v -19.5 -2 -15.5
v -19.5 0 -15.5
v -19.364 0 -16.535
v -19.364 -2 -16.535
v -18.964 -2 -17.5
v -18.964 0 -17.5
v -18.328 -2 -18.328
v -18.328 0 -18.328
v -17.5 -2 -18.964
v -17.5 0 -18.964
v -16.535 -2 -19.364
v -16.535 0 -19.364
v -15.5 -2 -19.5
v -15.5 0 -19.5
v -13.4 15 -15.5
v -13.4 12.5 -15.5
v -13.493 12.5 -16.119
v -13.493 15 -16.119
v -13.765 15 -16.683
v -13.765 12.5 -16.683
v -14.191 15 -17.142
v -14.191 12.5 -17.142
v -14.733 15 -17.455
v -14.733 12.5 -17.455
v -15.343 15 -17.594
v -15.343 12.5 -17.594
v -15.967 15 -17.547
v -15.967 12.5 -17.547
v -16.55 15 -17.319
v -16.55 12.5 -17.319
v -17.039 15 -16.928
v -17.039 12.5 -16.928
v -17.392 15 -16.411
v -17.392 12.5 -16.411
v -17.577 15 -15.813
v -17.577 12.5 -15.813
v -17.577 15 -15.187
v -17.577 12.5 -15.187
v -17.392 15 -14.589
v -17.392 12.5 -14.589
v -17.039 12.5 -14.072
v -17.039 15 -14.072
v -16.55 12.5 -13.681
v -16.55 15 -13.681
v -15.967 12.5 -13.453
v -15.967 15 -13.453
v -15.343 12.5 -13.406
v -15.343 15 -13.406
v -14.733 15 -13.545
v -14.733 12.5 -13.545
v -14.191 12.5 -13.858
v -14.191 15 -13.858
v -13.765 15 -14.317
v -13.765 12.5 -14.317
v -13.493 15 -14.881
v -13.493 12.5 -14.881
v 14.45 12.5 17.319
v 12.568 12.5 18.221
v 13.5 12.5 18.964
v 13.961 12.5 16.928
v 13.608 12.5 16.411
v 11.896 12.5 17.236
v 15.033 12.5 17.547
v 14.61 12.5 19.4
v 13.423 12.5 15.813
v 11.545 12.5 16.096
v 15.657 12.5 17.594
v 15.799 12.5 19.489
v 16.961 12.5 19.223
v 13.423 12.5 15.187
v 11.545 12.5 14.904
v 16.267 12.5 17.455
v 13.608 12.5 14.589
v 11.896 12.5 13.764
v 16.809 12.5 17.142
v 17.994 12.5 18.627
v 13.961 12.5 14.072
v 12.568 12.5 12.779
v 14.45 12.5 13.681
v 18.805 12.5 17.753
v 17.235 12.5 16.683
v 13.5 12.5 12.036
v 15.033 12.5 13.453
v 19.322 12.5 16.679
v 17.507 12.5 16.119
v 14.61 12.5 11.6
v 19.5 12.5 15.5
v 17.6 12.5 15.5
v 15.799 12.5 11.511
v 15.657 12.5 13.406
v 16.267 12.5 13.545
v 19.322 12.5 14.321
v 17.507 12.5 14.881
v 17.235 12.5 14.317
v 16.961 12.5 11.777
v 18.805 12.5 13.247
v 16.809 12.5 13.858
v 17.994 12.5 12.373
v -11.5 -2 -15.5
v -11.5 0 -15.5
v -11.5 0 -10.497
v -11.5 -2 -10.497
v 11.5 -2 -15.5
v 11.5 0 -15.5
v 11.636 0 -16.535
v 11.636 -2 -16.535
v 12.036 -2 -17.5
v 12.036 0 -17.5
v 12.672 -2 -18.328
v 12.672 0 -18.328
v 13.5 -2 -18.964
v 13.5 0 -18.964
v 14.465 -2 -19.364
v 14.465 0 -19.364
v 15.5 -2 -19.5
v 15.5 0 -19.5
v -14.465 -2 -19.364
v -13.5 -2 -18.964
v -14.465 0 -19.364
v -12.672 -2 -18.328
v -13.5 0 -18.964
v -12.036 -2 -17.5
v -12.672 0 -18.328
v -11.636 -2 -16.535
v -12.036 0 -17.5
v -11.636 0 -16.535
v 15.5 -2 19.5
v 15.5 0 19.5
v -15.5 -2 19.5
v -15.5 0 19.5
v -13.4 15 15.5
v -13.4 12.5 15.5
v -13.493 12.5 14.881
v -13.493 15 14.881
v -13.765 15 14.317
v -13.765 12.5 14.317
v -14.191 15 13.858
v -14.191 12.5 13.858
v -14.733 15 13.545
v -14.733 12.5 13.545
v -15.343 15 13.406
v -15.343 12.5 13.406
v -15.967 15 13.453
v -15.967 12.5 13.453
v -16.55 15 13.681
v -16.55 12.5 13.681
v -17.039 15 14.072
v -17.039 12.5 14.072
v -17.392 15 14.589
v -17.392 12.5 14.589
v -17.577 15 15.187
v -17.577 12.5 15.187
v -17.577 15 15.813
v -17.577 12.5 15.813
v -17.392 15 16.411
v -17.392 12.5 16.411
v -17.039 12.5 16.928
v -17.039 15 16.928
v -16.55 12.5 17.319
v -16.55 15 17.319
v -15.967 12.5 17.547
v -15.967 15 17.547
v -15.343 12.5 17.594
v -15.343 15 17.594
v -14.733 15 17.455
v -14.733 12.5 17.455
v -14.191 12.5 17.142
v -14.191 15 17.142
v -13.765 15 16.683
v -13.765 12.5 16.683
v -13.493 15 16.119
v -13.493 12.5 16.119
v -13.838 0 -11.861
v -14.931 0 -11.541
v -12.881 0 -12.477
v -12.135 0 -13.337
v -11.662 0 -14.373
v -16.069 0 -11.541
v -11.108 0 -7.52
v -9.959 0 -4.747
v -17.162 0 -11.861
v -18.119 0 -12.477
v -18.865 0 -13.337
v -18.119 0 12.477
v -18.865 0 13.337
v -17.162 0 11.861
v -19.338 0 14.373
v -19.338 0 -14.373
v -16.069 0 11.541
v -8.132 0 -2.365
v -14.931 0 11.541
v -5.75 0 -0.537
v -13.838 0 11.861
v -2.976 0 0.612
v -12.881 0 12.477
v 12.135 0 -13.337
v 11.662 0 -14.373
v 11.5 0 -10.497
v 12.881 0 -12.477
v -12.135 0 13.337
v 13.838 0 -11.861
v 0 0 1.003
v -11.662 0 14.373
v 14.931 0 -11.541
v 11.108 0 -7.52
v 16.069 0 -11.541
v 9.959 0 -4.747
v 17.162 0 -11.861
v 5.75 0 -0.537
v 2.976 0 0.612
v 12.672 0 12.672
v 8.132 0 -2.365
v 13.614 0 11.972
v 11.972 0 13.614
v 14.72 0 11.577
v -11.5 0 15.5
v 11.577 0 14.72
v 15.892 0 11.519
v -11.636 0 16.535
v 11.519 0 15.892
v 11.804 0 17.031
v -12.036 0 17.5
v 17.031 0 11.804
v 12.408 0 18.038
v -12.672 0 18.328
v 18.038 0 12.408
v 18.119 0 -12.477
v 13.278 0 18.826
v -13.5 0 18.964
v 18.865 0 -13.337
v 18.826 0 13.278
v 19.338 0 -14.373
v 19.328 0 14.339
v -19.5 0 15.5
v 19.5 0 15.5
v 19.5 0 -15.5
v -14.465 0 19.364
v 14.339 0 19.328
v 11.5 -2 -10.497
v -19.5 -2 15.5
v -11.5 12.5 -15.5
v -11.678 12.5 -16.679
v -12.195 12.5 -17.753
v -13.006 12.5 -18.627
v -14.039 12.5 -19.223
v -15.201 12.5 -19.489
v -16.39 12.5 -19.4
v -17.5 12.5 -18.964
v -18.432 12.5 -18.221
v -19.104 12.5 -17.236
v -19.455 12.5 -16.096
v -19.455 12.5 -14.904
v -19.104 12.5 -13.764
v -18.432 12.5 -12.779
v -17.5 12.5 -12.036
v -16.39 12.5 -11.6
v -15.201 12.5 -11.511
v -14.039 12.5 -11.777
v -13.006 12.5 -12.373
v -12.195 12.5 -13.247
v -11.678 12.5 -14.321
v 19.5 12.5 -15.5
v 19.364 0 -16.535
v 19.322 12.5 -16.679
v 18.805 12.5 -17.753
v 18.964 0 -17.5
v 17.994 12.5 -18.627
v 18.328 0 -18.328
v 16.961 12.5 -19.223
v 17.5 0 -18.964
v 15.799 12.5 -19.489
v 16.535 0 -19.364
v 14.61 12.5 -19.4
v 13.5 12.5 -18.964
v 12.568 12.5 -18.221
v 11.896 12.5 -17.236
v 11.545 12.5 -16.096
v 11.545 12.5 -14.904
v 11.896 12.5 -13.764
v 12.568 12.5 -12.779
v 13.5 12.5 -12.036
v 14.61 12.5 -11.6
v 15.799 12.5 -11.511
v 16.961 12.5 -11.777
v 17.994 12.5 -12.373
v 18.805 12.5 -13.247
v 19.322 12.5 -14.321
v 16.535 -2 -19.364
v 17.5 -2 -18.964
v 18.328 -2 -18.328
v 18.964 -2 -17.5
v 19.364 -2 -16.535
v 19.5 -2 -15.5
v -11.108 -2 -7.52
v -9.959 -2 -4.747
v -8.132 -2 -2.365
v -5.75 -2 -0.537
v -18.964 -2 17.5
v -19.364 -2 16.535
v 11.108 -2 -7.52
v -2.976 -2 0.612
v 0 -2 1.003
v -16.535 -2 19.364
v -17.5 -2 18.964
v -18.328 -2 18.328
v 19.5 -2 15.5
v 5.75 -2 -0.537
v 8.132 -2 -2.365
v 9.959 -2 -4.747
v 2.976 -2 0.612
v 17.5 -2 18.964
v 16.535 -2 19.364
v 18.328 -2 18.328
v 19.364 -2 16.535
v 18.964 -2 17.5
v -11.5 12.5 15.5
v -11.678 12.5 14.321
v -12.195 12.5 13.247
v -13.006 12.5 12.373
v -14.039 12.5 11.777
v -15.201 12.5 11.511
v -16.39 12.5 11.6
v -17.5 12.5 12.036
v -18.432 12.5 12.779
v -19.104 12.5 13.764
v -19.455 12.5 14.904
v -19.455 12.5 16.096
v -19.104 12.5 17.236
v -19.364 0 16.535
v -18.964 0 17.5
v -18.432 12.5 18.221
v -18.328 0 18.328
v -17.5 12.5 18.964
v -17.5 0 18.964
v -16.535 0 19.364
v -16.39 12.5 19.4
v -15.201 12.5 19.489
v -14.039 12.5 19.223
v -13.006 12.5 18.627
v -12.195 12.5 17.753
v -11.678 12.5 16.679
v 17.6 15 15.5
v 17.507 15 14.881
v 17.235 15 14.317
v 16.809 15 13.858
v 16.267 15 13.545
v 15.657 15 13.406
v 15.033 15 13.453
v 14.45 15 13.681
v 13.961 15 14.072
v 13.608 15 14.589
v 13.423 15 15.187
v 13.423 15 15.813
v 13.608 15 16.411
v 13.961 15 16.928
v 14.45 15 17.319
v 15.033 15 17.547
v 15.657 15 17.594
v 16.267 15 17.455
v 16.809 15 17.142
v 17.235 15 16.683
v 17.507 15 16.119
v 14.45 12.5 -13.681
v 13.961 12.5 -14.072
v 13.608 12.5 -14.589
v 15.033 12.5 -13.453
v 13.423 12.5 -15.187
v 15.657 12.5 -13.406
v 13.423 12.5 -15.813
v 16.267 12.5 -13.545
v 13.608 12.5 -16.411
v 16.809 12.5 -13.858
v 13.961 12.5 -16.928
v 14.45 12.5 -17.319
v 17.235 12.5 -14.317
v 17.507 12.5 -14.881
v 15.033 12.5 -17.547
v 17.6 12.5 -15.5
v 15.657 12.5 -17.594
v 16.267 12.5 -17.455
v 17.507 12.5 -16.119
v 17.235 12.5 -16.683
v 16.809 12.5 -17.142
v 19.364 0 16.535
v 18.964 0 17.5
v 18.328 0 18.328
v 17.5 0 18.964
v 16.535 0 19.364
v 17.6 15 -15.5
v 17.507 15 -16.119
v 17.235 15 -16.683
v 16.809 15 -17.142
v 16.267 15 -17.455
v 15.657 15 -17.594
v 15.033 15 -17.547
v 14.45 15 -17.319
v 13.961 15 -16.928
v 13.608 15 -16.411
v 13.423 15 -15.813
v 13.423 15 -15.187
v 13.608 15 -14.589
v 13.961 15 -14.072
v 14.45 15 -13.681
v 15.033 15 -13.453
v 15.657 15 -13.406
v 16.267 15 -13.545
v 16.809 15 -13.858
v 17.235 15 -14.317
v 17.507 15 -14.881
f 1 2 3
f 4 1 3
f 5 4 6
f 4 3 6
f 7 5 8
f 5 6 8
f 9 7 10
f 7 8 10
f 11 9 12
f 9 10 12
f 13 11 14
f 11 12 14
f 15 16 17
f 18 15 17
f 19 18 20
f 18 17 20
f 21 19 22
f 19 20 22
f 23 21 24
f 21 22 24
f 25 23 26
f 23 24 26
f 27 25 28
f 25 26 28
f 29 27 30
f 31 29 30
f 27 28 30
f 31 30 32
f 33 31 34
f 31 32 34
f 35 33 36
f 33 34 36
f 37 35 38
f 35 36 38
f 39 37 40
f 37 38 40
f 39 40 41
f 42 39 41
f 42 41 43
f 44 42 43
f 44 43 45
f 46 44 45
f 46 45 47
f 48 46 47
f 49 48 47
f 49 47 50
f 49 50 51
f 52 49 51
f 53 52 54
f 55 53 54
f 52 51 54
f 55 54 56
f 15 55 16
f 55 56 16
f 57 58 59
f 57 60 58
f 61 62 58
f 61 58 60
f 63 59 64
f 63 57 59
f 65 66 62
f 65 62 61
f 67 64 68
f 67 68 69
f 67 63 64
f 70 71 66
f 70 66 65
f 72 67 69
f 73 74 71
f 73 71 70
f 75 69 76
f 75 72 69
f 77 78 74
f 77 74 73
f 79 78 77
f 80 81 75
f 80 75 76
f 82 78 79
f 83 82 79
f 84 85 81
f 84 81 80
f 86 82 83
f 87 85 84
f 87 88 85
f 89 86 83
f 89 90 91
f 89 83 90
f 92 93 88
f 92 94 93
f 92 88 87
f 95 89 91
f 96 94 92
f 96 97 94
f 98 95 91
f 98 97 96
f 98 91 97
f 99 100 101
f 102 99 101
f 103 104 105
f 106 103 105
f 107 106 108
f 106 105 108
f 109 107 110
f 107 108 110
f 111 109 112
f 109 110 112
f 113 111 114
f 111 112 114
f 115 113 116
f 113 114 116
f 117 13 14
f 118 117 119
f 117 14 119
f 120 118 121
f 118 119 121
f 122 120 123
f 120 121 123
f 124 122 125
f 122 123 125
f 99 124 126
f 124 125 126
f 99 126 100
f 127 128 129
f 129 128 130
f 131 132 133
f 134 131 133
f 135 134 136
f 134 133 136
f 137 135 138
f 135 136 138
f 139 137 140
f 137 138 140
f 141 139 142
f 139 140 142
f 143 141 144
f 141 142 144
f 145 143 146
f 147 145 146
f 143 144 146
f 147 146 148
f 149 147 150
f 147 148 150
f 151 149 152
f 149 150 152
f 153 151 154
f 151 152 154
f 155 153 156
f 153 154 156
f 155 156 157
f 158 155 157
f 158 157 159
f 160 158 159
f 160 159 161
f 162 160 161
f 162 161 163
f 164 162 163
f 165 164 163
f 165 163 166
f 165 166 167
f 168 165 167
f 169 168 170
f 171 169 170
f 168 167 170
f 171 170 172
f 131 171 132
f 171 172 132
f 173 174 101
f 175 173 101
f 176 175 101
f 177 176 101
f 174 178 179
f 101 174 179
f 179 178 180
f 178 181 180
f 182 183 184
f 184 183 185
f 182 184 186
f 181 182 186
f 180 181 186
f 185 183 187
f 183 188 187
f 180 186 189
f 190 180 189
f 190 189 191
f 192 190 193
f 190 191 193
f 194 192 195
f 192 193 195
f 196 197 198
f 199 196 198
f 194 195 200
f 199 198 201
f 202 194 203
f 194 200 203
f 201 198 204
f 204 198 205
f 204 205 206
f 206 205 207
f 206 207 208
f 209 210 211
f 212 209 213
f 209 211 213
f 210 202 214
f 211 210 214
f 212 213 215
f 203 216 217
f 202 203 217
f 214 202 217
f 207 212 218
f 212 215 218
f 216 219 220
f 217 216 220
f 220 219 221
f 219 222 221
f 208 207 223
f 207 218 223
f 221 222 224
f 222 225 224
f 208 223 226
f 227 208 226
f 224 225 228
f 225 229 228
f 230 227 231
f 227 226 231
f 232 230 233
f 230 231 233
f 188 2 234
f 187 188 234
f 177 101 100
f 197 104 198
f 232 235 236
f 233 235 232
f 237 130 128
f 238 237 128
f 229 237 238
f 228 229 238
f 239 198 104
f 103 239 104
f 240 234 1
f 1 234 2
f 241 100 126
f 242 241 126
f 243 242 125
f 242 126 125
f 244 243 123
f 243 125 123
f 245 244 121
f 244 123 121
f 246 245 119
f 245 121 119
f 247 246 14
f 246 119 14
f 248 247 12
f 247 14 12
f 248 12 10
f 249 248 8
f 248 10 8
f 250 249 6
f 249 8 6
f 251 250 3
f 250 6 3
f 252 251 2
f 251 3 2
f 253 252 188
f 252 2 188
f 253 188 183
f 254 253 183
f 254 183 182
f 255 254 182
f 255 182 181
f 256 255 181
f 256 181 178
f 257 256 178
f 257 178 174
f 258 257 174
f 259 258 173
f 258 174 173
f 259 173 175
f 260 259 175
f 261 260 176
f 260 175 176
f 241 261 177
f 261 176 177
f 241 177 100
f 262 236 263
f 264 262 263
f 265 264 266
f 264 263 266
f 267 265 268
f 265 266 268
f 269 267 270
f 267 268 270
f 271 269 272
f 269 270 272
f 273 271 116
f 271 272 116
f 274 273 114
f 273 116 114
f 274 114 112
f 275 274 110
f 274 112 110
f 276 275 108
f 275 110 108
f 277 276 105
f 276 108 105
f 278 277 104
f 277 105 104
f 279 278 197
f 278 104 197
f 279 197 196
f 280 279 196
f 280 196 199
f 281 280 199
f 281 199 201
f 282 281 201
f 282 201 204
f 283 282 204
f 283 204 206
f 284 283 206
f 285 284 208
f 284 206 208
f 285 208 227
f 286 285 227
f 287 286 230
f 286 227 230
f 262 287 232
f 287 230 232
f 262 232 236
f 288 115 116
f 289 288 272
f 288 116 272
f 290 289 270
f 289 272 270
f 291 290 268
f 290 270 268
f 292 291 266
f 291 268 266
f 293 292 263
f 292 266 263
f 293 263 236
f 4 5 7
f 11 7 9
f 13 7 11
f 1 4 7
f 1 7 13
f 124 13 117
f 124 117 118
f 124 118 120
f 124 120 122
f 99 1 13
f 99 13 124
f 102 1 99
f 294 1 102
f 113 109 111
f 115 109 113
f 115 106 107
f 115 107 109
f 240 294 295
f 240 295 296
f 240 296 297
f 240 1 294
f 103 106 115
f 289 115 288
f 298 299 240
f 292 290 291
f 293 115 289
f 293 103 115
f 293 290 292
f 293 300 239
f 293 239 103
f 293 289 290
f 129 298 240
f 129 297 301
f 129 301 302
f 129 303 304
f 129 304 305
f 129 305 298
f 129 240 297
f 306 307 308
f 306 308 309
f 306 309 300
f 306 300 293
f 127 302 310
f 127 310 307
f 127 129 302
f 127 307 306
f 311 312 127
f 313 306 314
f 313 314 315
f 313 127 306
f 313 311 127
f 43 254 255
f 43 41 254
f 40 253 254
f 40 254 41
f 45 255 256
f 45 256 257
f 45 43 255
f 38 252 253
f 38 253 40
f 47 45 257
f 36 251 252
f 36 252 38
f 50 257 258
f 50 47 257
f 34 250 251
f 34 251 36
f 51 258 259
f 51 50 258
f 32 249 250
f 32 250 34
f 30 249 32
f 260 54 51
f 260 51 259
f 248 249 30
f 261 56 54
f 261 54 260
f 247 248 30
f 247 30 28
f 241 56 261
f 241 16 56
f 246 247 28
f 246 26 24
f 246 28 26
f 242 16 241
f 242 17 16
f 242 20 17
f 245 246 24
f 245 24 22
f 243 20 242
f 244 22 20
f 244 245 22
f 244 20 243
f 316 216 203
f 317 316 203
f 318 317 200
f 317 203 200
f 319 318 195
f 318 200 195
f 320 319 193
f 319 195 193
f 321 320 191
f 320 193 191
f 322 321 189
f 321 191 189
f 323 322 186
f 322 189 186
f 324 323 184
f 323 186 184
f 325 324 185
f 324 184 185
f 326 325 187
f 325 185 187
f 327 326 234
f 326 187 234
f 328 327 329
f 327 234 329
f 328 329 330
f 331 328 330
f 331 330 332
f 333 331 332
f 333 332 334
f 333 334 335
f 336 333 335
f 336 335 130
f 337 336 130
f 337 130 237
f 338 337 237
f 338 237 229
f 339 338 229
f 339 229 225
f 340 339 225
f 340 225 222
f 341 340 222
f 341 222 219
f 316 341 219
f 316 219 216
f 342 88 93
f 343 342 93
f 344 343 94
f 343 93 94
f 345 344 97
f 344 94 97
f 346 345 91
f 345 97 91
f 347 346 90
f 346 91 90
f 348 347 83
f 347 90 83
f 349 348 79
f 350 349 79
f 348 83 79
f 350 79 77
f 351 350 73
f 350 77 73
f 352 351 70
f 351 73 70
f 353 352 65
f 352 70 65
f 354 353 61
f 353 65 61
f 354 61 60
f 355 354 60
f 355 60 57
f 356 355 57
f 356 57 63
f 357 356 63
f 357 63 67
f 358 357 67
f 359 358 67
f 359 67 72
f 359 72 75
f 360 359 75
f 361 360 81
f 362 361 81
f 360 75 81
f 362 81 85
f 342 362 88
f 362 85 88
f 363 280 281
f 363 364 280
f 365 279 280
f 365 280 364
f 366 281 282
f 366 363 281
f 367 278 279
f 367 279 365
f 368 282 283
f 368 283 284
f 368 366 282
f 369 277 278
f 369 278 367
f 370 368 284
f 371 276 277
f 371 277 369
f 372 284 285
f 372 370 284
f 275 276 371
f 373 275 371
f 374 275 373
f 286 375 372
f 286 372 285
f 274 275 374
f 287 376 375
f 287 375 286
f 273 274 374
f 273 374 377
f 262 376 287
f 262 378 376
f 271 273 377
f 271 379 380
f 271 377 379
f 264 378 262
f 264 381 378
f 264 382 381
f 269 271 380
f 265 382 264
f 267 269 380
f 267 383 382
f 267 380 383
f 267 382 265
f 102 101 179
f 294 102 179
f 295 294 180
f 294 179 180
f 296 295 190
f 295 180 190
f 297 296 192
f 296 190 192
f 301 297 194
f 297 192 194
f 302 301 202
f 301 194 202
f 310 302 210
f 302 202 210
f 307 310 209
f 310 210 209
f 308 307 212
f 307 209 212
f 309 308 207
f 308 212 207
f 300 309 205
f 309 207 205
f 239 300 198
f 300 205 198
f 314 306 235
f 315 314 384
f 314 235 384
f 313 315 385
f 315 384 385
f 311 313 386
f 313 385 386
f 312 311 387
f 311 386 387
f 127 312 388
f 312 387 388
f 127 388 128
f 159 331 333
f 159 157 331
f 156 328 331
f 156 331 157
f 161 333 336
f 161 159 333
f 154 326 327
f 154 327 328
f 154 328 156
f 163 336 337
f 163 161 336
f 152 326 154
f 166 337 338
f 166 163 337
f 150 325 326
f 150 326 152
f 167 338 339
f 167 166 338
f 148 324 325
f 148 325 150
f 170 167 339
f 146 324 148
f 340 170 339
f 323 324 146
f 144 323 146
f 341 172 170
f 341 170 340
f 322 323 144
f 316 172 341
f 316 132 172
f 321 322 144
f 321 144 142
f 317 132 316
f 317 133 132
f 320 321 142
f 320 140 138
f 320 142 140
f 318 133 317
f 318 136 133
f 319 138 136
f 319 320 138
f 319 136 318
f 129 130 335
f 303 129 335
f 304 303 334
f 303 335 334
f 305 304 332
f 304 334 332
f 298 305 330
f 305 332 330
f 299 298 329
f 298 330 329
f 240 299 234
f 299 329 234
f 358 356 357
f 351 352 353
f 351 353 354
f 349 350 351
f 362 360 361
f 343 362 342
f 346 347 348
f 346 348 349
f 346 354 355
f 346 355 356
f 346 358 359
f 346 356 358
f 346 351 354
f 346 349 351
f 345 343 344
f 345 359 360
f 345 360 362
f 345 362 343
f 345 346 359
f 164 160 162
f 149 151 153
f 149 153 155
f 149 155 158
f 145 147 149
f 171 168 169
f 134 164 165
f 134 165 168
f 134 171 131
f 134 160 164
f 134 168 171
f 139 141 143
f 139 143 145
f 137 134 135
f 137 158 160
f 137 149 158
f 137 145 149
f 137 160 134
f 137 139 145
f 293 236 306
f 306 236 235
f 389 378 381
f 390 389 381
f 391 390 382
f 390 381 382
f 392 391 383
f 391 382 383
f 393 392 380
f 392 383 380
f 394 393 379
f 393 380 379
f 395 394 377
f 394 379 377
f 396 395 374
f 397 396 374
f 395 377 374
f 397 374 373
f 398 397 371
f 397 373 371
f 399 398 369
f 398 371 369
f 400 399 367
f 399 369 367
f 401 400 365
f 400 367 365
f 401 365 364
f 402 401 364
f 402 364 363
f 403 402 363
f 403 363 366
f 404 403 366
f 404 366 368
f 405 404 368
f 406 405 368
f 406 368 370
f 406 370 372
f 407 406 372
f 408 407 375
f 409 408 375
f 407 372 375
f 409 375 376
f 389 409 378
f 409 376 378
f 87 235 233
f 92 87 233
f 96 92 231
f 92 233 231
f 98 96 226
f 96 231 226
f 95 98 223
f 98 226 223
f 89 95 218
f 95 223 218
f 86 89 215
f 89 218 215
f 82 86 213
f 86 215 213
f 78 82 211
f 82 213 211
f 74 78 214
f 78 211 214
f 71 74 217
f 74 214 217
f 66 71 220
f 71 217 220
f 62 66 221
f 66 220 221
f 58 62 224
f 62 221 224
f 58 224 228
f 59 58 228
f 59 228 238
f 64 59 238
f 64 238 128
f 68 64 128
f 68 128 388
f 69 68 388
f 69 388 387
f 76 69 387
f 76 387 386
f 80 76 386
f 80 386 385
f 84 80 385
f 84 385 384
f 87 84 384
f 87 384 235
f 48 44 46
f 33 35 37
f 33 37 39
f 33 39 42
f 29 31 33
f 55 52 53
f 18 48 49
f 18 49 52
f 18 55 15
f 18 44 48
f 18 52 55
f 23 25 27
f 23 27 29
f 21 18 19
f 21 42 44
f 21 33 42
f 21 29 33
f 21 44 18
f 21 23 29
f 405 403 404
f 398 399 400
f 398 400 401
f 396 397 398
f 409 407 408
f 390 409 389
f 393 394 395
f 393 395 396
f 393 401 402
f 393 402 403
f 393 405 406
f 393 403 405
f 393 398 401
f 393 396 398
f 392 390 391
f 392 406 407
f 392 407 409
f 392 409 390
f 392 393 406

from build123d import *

# Parameters (mm, degrees)
SKETCH1_R             = 4
BOSS_EXTRUDE1_DEPTH   = 12.5
BOSS_EXTRUDE1_2_DEPTH = 12.5
BOSS_EXTRUDE1_3_DEPTH = 12.5
BOSS_EXTRUDE1_4_DEPTH = 12.5
SKETCH2_R             = 2.1
BOSS_EXTRUDE2_DEPTH   = 2.5
BOSS_EXTRUDE3_DEPTH   = 2


with BuildPart() as part:
    # Sketch1 → Boss-Extrude1 (new body)
    with BuildSketch(Plane(origin=(0, 0, 0), x_dir=(1, 0, 0), z_dir=(0, 1, 0))):
        with Locations((-15.5, -15.5)):
            Circle(SKETCH1_R)
    extrude(amount=BOSS_EXTRUDE1_DEPTH)



with BuildPart() as body_2:
    # Sketch1 → Boss-Extrude1 2 (new body)
    with BuildSketch(Plane(origin=(0, 0, 0), x_dir=(1, 0, 0), z_dir=(0, 1, 0))):
        with Locations((-15.5, 15.5)):
            Circle(SKETCH1_R)
    extrude(amount=BOSS_EXTRUDE1_2_DEPTH)


with BuildPart() as body_3:
    # Sketch1 → Boss-Extrude1 3 (new body)
    with BuildSketch(Plane(origin=(0, 0, 0), x_dir=(1, 0, 0), z_dir=(0, 1, 0))):
        with Locations((15.5, -15.5)):
            Circle(SKETCH1_R)
    extrude(amount=BOSS_EXTRUDE1_3_DEPTH)


with BuildPart() as body_4:
    # Sketch1 → Boss-Extrude1 4 (new body)
    with BuildSketch(Plane(origin=(0, 0, 0), x_dir=(1, 0, 0), z_dir=(0, 1, 0))):
        with Locations((15.5, 15.5)):
            Circle(SKETCH1_R)
    extrude(amount=BOSS_EXTRUDE1_4_DEPTH)


with BuildPart() as part_1:
    add(part.part)

    add(body_2.part)  # Boss-Extrude2 merges body 2

    add(body_3.part)  # Boss-Extrude2 merges body 3

    add(body_4.part)  # Boss-Extrude2 merges body 4
    # Sketch2 → Boss-Extrude2 (add)
    with BuildSketch(Plane(origin=(0, 12.5, 0), x_dir=(1, 0, 0), z_dir=(0, 1, 0))):
        with Locations((-15.5, 15.5)):
            Circle(SKETCH2_R)
        with Locations((15.5, 15.5)):
            Circle(SKETCH2_R)
        with Locations((15.5, -15.5)):
            Circle(SKETCH2_R)
        with Locations((-15.5, -15.5)):
            Circle(SKETCH2_R)
    extrude(amount=BOSS_EXTRUDE2_DEPTH)

    # Sketch3 → Boss-Extrude3 (add)
    with BuildSketch(Plane.XZ):
        with BuildLine():
            Line((-19.5, 15.5), (-19.5, -15.5))
            ThreePointArc((-19.5, -15.5), (-18.328427125, -18.328427125), (-15.5, -19.5))
            ThreePointArc((-15.5, -19.5), (-12.671572875, -18.328427125), (-11.5, -15.5))
            Line((-11.5, -15.5), (-11.5, -10.496545835))
            ThreePointArc((-11.5, -10.496545835), (0, 1.003454165), (11.5, -10.496545835))
            Line((11.5, -10.496545835), (11.5, -15.5))
            ThreePointArc((11.5, -15.5), (12.671572875, -18.328427125), (15.5, -19.5))
            ThreePointArc((15.5, -19.5), (18.328427125, -18.328427125), (19.5, -15.5))
            Line((19.5, -15.5), (19.5, 15.5))
            ThreePointArc((19.5, 15.5), (18.328427125, 18.328427125), (15.5, 19.5))
            Line((15.5, 19.5), (-15.5, 19.5))
            ThreePointArc((-15.5, 19.5), (-18.328427125, 18.328427125), (-19.5, 15.5))
        make_face()
    extrude(amount=BOSS_EXTRUDE3_DEPTH)


solid = part_1.part
